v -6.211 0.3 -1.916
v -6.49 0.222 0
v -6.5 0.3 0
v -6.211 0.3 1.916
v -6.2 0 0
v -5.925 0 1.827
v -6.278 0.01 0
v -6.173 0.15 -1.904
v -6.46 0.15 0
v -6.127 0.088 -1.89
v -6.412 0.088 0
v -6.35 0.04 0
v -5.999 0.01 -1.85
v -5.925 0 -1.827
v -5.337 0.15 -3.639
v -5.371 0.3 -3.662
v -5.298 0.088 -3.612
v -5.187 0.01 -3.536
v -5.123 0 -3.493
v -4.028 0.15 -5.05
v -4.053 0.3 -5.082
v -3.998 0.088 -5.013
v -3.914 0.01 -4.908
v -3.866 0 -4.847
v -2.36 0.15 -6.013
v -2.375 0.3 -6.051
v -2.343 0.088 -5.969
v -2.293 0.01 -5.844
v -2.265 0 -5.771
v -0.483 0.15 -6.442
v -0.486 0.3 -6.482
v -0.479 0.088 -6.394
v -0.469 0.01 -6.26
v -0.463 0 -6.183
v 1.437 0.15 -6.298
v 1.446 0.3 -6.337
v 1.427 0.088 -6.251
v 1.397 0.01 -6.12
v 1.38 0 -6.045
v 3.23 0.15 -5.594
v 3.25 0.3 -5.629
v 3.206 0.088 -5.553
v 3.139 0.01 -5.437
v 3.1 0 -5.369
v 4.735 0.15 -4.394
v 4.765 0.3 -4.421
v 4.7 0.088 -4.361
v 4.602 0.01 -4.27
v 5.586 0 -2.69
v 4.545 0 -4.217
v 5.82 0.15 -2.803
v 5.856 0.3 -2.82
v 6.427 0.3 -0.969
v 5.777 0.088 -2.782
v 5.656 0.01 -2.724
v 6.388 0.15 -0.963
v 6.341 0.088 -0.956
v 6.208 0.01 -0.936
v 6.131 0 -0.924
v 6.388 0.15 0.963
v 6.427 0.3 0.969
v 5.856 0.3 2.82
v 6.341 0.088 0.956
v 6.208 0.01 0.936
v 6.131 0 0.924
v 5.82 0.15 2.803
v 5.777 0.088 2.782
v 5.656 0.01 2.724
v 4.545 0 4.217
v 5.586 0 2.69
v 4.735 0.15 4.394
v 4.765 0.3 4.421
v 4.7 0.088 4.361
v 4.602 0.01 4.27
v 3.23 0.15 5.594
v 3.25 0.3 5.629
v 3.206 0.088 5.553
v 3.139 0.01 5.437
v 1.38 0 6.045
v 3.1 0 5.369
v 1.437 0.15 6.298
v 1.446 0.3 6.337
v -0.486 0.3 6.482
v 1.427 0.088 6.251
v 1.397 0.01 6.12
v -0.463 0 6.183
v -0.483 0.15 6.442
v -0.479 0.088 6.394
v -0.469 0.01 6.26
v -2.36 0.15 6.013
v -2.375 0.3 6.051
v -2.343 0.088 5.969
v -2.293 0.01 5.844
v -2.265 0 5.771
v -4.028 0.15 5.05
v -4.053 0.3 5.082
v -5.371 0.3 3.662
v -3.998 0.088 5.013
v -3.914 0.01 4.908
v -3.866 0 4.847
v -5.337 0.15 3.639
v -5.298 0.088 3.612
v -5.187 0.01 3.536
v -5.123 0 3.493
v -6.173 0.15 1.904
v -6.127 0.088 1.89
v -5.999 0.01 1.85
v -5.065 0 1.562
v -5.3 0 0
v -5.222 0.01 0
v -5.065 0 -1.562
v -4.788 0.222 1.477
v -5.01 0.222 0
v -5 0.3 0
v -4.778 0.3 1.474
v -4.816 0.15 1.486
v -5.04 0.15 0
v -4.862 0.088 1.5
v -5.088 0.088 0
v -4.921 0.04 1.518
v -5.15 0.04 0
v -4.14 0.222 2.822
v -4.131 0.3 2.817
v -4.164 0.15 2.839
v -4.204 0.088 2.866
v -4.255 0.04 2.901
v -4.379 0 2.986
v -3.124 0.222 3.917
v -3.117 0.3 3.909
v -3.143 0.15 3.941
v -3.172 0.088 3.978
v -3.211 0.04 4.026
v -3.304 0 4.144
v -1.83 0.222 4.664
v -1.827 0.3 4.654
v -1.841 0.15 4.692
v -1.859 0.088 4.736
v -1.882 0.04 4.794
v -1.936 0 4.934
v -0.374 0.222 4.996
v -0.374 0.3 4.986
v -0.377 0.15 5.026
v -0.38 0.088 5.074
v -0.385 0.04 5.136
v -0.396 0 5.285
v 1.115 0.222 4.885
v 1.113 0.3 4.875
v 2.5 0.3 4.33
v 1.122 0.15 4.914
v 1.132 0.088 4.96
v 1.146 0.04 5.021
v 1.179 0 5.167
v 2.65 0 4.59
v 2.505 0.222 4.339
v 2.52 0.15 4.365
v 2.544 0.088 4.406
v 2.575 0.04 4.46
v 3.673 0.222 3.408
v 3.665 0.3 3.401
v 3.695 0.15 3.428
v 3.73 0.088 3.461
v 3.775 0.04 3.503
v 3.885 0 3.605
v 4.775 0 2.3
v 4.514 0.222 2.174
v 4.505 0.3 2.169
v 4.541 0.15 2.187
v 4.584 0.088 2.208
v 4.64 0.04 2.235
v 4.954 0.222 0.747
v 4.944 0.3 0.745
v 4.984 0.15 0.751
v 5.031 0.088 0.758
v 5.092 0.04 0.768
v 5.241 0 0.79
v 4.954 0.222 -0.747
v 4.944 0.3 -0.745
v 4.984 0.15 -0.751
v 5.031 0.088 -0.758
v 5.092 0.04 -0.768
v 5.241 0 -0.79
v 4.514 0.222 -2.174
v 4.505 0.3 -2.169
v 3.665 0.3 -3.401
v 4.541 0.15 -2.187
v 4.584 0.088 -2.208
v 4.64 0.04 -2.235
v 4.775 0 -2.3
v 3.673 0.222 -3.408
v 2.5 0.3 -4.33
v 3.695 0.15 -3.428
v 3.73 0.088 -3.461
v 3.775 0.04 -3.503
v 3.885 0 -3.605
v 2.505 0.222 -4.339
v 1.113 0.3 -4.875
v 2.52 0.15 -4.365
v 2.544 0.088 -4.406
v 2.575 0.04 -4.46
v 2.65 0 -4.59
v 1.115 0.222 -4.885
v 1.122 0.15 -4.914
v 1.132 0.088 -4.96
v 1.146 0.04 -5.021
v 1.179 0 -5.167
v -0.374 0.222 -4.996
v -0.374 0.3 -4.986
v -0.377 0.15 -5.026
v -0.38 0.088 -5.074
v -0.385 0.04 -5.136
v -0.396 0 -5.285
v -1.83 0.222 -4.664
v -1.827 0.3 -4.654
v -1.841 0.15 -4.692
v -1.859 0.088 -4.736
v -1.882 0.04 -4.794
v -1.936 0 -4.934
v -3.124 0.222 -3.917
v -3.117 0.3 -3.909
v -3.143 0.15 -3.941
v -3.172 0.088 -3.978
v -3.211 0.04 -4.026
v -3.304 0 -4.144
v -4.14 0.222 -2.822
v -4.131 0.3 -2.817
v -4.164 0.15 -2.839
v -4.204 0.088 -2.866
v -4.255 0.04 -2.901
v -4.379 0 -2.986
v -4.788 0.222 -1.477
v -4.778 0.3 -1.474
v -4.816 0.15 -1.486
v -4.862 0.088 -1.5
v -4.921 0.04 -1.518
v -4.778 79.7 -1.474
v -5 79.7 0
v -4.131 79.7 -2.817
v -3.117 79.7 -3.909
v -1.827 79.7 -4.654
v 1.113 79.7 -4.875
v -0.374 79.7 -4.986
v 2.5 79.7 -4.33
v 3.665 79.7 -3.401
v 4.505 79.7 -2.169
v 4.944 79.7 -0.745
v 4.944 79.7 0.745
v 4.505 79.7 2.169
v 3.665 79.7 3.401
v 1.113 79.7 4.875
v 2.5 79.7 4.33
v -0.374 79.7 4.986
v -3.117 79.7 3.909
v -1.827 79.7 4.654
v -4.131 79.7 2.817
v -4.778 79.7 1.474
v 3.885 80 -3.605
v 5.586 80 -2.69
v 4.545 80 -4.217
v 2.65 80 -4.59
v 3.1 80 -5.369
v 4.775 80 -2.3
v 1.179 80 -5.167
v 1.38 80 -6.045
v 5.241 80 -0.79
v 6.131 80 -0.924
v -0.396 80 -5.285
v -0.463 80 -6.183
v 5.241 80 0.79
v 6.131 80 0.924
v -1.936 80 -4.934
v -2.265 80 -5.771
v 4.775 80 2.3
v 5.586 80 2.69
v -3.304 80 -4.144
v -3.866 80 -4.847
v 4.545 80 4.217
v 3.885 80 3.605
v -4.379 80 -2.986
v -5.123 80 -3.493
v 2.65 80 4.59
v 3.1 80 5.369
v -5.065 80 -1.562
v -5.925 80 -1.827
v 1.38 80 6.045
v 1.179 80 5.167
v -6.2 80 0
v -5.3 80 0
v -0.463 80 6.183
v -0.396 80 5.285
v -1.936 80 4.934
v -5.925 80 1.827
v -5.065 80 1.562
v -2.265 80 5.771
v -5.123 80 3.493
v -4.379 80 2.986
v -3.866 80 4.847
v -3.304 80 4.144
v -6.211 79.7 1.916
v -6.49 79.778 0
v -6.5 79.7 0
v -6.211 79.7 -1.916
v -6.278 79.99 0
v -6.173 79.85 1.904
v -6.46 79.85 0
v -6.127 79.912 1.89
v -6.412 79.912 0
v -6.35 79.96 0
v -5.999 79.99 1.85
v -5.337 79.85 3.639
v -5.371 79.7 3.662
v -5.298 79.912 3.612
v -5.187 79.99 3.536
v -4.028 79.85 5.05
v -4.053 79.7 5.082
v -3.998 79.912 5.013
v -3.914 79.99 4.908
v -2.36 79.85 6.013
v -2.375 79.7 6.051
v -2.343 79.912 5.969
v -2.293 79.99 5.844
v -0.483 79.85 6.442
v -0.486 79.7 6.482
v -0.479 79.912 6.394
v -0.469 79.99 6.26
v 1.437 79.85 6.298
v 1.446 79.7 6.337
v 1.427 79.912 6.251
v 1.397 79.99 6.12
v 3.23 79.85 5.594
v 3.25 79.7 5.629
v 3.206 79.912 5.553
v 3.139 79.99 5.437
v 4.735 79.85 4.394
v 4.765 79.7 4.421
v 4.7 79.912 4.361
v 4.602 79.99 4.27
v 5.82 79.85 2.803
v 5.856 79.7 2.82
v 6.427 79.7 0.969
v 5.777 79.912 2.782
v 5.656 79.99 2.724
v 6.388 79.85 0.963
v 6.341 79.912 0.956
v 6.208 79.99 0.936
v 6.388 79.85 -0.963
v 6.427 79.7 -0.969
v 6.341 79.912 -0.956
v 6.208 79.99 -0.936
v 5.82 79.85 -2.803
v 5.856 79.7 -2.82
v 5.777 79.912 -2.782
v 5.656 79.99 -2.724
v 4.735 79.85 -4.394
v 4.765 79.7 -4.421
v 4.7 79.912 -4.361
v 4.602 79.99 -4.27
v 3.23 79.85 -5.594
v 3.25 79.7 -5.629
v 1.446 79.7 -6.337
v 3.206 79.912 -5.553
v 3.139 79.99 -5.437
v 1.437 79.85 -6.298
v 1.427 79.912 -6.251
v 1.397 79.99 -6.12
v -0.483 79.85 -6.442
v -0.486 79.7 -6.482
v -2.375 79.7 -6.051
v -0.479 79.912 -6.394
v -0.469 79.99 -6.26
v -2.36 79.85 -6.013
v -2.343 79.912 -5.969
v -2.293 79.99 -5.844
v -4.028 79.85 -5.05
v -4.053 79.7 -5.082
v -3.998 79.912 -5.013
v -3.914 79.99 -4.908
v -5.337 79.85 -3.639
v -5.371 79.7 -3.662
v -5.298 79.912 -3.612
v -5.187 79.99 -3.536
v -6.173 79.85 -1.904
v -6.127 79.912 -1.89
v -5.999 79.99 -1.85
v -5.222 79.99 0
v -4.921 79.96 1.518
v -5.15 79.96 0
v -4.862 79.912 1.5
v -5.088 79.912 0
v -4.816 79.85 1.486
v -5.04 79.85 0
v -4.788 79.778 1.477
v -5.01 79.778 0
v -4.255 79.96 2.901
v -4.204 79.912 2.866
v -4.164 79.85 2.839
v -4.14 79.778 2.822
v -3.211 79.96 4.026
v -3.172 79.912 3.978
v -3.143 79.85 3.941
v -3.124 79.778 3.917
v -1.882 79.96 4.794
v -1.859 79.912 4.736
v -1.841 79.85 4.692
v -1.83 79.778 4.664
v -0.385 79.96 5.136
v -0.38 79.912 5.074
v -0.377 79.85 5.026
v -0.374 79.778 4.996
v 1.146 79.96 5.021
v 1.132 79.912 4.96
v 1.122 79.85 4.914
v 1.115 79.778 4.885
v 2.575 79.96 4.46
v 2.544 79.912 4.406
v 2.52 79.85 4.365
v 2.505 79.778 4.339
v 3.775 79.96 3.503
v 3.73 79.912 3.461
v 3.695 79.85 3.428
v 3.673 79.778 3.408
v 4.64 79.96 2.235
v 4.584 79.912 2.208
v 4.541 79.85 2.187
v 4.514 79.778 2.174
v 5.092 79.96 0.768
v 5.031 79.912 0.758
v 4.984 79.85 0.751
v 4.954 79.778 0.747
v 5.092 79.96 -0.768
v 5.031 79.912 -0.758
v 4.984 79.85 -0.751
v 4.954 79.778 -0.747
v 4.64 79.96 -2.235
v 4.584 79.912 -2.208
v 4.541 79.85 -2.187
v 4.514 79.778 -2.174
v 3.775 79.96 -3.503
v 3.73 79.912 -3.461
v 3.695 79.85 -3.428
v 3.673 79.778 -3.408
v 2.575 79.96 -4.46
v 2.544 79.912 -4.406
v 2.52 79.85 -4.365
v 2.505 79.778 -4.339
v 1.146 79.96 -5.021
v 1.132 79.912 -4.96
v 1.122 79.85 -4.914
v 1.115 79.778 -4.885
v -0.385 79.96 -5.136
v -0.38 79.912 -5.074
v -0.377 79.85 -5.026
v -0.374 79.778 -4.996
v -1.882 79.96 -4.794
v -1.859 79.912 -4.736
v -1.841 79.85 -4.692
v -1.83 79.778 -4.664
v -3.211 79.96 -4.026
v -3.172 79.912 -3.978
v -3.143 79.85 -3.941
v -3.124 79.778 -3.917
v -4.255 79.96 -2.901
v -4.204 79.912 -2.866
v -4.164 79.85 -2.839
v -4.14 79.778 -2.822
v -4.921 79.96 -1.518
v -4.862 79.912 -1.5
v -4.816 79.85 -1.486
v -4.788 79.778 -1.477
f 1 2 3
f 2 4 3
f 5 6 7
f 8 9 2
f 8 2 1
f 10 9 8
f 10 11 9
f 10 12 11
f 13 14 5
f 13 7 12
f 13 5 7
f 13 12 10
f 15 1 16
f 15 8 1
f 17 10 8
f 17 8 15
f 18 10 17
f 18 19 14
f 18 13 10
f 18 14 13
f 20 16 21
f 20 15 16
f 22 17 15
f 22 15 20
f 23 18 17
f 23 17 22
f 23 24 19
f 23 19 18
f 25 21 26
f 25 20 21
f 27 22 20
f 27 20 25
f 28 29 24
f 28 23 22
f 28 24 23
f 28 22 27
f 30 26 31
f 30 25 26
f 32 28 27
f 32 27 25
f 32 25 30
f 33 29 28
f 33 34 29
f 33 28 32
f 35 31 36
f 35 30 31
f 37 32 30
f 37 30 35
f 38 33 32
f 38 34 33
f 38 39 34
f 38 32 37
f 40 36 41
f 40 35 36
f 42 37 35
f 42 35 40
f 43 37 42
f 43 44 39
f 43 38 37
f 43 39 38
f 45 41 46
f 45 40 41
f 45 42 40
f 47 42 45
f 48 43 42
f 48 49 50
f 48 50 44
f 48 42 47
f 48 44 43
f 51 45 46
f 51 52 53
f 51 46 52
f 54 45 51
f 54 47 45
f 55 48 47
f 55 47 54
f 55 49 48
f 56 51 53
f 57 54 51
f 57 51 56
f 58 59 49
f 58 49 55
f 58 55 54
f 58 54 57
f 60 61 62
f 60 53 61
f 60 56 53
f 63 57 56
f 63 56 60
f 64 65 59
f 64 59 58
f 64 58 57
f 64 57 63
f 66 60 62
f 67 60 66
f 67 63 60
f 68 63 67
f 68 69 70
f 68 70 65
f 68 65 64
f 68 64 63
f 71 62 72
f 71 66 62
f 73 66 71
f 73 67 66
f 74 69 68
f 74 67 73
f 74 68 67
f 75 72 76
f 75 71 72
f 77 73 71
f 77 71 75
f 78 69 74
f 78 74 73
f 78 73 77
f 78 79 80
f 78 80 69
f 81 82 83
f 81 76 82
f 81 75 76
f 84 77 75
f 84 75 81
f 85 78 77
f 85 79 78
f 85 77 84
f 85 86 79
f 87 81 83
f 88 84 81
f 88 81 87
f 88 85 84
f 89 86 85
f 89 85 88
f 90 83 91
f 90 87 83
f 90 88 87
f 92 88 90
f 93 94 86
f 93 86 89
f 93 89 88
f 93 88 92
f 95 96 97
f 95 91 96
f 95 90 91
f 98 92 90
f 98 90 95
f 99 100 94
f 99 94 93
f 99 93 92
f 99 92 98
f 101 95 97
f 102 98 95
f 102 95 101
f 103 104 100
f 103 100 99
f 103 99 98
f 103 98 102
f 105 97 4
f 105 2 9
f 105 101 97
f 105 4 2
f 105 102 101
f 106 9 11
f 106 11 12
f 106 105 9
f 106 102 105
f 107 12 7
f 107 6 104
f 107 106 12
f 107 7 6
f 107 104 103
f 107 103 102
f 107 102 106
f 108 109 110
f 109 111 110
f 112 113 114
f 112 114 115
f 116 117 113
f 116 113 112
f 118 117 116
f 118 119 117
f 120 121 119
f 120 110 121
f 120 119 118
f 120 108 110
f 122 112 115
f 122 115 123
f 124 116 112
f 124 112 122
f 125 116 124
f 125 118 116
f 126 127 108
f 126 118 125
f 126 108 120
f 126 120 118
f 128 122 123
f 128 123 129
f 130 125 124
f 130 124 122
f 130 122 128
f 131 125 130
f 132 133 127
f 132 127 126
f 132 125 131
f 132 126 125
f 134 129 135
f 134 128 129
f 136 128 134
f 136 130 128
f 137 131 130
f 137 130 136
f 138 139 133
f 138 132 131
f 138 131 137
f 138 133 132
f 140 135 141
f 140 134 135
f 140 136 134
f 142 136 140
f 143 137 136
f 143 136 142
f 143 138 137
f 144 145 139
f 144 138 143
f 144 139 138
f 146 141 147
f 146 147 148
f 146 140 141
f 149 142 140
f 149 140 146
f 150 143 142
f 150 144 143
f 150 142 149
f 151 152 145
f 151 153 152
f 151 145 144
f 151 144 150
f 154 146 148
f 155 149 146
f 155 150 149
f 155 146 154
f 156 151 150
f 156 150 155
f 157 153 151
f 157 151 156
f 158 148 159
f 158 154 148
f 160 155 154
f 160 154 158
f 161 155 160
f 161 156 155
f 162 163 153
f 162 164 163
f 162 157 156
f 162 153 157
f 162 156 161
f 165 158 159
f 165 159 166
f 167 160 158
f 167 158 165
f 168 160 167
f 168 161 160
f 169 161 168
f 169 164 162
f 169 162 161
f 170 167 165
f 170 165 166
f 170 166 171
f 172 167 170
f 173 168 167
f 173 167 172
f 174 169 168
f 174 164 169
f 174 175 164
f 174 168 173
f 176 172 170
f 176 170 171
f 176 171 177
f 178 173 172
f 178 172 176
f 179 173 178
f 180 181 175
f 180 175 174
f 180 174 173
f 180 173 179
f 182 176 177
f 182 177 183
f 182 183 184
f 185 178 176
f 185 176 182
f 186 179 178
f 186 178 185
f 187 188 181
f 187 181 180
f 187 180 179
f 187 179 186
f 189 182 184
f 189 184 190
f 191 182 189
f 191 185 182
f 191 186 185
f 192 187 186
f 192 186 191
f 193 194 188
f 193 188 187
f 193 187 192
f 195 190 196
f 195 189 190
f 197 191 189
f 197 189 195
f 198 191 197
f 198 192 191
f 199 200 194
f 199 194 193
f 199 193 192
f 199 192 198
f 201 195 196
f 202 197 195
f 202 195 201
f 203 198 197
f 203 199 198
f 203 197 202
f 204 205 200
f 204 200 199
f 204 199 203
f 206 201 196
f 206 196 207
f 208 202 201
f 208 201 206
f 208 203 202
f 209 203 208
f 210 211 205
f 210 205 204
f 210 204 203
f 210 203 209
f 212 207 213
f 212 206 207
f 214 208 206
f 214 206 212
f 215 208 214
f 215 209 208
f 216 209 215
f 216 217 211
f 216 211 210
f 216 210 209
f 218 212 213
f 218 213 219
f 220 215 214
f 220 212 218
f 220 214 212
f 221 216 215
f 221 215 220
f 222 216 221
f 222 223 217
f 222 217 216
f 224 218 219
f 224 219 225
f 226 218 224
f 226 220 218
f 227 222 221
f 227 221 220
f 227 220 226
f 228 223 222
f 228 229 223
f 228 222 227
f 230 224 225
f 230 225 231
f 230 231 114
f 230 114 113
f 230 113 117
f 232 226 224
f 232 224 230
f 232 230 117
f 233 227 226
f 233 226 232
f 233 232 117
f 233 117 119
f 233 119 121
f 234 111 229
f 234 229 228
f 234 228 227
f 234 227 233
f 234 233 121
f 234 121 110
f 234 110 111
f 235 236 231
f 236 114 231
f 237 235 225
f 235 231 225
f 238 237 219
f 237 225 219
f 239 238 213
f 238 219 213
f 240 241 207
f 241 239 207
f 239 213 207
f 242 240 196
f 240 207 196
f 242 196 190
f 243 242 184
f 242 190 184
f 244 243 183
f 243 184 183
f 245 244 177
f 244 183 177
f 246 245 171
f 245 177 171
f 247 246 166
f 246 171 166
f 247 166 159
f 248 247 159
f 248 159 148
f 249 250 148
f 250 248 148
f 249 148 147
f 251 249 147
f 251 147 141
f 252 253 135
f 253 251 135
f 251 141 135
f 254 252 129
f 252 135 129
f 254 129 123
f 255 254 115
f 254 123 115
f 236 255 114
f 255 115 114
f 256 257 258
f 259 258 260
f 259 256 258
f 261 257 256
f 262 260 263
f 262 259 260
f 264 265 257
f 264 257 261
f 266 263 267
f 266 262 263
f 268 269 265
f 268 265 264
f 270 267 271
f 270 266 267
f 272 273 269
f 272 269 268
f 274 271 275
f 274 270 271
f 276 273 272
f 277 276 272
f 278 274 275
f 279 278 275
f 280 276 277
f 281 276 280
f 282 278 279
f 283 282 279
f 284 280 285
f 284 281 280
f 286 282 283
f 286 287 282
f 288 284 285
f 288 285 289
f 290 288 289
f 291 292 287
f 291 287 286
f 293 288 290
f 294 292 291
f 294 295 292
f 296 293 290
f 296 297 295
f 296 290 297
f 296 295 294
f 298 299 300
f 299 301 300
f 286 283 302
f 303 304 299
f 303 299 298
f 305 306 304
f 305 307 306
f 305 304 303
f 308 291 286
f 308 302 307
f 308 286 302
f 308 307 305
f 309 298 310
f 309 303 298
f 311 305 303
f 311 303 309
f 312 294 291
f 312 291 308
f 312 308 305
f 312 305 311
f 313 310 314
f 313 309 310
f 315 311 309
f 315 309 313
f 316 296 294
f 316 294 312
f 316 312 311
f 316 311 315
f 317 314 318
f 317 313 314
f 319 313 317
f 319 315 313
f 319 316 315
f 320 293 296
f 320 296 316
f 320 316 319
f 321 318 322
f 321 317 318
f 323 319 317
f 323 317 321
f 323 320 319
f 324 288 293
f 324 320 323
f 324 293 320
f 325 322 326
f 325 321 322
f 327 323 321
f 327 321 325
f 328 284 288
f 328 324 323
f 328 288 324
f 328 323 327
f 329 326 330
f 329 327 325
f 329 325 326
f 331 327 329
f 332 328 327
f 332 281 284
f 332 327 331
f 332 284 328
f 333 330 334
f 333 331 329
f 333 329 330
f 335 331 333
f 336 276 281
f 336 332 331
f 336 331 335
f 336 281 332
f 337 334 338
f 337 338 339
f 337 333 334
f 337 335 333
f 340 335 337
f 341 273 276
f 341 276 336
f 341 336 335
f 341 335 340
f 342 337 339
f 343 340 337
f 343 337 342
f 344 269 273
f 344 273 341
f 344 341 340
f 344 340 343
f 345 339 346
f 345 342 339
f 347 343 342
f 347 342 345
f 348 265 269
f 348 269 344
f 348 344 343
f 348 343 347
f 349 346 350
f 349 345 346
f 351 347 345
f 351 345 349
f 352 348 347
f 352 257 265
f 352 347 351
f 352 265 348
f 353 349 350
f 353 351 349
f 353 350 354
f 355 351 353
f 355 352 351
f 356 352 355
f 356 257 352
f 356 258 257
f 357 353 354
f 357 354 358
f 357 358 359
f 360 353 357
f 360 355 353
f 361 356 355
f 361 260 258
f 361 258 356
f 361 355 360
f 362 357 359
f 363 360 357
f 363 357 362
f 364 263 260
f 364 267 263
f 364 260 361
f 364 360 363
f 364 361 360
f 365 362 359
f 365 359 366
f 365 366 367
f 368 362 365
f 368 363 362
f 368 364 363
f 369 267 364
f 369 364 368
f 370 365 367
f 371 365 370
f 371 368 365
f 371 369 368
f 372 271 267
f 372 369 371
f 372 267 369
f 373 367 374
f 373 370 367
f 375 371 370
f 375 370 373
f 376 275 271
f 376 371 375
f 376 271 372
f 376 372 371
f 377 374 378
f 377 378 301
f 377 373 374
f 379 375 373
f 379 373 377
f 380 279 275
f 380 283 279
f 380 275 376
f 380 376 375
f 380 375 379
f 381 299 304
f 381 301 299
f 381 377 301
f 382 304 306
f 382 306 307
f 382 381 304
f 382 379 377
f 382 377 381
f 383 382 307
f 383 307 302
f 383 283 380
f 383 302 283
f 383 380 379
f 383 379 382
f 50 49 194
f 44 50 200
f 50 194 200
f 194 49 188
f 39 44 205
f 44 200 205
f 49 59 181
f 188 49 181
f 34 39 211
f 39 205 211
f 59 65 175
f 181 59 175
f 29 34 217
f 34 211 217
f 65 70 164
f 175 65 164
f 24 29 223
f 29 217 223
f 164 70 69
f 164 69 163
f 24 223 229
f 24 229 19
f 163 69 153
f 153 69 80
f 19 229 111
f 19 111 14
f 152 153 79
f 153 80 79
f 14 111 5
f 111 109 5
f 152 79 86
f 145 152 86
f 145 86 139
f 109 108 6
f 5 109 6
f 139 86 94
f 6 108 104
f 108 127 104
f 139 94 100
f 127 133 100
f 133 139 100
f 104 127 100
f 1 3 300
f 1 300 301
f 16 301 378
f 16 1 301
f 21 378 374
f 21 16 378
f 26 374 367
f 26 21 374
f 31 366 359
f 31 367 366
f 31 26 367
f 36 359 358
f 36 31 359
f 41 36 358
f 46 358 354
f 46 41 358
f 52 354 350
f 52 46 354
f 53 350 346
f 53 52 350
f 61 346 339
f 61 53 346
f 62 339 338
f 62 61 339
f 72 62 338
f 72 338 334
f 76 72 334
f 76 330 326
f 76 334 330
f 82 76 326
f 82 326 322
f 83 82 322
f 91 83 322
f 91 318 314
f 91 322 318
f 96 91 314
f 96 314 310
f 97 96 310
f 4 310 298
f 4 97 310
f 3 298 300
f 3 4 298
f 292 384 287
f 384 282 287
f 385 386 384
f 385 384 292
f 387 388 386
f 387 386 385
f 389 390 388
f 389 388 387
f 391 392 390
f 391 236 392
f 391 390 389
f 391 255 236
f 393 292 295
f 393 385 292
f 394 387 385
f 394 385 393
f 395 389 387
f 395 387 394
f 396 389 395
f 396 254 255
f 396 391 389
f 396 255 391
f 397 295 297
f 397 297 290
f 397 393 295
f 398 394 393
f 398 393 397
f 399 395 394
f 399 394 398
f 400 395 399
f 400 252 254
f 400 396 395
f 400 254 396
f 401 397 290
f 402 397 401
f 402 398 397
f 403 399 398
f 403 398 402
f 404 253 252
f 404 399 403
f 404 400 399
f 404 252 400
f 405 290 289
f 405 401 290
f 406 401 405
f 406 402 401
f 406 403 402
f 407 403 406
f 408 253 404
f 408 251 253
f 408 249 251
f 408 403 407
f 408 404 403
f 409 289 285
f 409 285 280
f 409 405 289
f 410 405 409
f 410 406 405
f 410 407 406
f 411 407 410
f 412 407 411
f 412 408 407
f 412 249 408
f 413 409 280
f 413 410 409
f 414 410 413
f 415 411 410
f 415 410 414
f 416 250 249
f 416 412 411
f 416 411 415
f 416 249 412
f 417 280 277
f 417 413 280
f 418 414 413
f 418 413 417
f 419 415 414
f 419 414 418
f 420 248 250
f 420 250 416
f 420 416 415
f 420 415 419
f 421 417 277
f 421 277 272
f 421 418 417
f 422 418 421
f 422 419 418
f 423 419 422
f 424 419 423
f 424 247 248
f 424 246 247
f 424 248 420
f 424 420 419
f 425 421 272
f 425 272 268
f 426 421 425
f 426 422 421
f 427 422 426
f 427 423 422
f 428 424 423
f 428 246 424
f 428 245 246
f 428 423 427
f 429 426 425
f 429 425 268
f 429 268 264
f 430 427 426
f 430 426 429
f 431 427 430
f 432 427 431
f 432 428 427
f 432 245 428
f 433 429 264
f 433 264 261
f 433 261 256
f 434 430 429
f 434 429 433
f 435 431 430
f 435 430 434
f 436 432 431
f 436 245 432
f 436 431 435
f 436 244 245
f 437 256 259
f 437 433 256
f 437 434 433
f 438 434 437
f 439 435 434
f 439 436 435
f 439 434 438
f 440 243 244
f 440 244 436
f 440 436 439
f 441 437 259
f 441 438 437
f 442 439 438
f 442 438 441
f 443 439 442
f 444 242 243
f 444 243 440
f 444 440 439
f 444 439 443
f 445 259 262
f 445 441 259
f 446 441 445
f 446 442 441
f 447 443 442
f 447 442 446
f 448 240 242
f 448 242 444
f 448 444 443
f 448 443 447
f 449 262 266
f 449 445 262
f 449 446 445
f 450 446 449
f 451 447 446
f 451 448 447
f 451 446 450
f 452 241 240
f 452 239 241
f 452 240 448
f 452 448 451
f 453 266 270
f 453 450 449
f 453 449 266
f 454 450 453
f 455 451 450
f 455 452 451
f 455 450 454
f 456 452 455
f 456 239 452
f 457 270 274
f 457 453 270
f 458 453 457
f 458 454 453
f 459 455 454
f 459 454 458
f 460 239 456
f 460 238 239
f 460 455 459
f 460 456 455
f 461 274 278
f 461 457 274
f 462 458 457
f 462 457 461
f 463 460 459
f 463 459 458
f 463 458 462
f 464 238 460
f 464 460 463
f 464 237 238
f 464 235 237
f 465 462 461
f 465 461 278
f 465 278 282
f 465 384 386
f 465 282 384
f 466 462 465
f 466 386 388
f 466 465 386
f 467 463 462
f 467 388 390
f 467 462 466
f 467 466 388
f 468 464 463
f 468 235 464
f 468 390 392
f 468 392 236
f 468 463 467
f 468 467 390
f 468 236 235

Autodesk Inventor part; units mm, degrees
ref_plane "YZ Plane" through (0, 0, 0) normal (1, 0, 0) x (0, 1, 0)
ref_plane "XZ Plane" through (0, 0, 0) normal (0, 1, 0) x (-1, 0, 0)
ref_plane "XY Plane" through (0, 0, 0) normal (0, 0, 1) x (1, 0, 0)
sketch "Sketch3" plane through (0, 0, 0) normal (0, 1, 0) x (-1, 0, 0)
  circle A0 centre (0, 0) radius 6.5
  circle A1 centre (0, 0) radius 5
  dimension "d4" = 13
  dimension "d6" = 10
extrude "Extrusion2" add sketch "Sketch3" along normal blind 80
fillet "Fillet1" radius 0.3 2 edges at (6.5, 0, 0) (5, 0, 0)
fillet "Fillet2" radius 0.3 1 edges at (6.5, 80, 0)
fillet "Fillet3" radius 0.3 1 edges at (5, 80, 0)
properties part number "tube_long" material "Glass"
